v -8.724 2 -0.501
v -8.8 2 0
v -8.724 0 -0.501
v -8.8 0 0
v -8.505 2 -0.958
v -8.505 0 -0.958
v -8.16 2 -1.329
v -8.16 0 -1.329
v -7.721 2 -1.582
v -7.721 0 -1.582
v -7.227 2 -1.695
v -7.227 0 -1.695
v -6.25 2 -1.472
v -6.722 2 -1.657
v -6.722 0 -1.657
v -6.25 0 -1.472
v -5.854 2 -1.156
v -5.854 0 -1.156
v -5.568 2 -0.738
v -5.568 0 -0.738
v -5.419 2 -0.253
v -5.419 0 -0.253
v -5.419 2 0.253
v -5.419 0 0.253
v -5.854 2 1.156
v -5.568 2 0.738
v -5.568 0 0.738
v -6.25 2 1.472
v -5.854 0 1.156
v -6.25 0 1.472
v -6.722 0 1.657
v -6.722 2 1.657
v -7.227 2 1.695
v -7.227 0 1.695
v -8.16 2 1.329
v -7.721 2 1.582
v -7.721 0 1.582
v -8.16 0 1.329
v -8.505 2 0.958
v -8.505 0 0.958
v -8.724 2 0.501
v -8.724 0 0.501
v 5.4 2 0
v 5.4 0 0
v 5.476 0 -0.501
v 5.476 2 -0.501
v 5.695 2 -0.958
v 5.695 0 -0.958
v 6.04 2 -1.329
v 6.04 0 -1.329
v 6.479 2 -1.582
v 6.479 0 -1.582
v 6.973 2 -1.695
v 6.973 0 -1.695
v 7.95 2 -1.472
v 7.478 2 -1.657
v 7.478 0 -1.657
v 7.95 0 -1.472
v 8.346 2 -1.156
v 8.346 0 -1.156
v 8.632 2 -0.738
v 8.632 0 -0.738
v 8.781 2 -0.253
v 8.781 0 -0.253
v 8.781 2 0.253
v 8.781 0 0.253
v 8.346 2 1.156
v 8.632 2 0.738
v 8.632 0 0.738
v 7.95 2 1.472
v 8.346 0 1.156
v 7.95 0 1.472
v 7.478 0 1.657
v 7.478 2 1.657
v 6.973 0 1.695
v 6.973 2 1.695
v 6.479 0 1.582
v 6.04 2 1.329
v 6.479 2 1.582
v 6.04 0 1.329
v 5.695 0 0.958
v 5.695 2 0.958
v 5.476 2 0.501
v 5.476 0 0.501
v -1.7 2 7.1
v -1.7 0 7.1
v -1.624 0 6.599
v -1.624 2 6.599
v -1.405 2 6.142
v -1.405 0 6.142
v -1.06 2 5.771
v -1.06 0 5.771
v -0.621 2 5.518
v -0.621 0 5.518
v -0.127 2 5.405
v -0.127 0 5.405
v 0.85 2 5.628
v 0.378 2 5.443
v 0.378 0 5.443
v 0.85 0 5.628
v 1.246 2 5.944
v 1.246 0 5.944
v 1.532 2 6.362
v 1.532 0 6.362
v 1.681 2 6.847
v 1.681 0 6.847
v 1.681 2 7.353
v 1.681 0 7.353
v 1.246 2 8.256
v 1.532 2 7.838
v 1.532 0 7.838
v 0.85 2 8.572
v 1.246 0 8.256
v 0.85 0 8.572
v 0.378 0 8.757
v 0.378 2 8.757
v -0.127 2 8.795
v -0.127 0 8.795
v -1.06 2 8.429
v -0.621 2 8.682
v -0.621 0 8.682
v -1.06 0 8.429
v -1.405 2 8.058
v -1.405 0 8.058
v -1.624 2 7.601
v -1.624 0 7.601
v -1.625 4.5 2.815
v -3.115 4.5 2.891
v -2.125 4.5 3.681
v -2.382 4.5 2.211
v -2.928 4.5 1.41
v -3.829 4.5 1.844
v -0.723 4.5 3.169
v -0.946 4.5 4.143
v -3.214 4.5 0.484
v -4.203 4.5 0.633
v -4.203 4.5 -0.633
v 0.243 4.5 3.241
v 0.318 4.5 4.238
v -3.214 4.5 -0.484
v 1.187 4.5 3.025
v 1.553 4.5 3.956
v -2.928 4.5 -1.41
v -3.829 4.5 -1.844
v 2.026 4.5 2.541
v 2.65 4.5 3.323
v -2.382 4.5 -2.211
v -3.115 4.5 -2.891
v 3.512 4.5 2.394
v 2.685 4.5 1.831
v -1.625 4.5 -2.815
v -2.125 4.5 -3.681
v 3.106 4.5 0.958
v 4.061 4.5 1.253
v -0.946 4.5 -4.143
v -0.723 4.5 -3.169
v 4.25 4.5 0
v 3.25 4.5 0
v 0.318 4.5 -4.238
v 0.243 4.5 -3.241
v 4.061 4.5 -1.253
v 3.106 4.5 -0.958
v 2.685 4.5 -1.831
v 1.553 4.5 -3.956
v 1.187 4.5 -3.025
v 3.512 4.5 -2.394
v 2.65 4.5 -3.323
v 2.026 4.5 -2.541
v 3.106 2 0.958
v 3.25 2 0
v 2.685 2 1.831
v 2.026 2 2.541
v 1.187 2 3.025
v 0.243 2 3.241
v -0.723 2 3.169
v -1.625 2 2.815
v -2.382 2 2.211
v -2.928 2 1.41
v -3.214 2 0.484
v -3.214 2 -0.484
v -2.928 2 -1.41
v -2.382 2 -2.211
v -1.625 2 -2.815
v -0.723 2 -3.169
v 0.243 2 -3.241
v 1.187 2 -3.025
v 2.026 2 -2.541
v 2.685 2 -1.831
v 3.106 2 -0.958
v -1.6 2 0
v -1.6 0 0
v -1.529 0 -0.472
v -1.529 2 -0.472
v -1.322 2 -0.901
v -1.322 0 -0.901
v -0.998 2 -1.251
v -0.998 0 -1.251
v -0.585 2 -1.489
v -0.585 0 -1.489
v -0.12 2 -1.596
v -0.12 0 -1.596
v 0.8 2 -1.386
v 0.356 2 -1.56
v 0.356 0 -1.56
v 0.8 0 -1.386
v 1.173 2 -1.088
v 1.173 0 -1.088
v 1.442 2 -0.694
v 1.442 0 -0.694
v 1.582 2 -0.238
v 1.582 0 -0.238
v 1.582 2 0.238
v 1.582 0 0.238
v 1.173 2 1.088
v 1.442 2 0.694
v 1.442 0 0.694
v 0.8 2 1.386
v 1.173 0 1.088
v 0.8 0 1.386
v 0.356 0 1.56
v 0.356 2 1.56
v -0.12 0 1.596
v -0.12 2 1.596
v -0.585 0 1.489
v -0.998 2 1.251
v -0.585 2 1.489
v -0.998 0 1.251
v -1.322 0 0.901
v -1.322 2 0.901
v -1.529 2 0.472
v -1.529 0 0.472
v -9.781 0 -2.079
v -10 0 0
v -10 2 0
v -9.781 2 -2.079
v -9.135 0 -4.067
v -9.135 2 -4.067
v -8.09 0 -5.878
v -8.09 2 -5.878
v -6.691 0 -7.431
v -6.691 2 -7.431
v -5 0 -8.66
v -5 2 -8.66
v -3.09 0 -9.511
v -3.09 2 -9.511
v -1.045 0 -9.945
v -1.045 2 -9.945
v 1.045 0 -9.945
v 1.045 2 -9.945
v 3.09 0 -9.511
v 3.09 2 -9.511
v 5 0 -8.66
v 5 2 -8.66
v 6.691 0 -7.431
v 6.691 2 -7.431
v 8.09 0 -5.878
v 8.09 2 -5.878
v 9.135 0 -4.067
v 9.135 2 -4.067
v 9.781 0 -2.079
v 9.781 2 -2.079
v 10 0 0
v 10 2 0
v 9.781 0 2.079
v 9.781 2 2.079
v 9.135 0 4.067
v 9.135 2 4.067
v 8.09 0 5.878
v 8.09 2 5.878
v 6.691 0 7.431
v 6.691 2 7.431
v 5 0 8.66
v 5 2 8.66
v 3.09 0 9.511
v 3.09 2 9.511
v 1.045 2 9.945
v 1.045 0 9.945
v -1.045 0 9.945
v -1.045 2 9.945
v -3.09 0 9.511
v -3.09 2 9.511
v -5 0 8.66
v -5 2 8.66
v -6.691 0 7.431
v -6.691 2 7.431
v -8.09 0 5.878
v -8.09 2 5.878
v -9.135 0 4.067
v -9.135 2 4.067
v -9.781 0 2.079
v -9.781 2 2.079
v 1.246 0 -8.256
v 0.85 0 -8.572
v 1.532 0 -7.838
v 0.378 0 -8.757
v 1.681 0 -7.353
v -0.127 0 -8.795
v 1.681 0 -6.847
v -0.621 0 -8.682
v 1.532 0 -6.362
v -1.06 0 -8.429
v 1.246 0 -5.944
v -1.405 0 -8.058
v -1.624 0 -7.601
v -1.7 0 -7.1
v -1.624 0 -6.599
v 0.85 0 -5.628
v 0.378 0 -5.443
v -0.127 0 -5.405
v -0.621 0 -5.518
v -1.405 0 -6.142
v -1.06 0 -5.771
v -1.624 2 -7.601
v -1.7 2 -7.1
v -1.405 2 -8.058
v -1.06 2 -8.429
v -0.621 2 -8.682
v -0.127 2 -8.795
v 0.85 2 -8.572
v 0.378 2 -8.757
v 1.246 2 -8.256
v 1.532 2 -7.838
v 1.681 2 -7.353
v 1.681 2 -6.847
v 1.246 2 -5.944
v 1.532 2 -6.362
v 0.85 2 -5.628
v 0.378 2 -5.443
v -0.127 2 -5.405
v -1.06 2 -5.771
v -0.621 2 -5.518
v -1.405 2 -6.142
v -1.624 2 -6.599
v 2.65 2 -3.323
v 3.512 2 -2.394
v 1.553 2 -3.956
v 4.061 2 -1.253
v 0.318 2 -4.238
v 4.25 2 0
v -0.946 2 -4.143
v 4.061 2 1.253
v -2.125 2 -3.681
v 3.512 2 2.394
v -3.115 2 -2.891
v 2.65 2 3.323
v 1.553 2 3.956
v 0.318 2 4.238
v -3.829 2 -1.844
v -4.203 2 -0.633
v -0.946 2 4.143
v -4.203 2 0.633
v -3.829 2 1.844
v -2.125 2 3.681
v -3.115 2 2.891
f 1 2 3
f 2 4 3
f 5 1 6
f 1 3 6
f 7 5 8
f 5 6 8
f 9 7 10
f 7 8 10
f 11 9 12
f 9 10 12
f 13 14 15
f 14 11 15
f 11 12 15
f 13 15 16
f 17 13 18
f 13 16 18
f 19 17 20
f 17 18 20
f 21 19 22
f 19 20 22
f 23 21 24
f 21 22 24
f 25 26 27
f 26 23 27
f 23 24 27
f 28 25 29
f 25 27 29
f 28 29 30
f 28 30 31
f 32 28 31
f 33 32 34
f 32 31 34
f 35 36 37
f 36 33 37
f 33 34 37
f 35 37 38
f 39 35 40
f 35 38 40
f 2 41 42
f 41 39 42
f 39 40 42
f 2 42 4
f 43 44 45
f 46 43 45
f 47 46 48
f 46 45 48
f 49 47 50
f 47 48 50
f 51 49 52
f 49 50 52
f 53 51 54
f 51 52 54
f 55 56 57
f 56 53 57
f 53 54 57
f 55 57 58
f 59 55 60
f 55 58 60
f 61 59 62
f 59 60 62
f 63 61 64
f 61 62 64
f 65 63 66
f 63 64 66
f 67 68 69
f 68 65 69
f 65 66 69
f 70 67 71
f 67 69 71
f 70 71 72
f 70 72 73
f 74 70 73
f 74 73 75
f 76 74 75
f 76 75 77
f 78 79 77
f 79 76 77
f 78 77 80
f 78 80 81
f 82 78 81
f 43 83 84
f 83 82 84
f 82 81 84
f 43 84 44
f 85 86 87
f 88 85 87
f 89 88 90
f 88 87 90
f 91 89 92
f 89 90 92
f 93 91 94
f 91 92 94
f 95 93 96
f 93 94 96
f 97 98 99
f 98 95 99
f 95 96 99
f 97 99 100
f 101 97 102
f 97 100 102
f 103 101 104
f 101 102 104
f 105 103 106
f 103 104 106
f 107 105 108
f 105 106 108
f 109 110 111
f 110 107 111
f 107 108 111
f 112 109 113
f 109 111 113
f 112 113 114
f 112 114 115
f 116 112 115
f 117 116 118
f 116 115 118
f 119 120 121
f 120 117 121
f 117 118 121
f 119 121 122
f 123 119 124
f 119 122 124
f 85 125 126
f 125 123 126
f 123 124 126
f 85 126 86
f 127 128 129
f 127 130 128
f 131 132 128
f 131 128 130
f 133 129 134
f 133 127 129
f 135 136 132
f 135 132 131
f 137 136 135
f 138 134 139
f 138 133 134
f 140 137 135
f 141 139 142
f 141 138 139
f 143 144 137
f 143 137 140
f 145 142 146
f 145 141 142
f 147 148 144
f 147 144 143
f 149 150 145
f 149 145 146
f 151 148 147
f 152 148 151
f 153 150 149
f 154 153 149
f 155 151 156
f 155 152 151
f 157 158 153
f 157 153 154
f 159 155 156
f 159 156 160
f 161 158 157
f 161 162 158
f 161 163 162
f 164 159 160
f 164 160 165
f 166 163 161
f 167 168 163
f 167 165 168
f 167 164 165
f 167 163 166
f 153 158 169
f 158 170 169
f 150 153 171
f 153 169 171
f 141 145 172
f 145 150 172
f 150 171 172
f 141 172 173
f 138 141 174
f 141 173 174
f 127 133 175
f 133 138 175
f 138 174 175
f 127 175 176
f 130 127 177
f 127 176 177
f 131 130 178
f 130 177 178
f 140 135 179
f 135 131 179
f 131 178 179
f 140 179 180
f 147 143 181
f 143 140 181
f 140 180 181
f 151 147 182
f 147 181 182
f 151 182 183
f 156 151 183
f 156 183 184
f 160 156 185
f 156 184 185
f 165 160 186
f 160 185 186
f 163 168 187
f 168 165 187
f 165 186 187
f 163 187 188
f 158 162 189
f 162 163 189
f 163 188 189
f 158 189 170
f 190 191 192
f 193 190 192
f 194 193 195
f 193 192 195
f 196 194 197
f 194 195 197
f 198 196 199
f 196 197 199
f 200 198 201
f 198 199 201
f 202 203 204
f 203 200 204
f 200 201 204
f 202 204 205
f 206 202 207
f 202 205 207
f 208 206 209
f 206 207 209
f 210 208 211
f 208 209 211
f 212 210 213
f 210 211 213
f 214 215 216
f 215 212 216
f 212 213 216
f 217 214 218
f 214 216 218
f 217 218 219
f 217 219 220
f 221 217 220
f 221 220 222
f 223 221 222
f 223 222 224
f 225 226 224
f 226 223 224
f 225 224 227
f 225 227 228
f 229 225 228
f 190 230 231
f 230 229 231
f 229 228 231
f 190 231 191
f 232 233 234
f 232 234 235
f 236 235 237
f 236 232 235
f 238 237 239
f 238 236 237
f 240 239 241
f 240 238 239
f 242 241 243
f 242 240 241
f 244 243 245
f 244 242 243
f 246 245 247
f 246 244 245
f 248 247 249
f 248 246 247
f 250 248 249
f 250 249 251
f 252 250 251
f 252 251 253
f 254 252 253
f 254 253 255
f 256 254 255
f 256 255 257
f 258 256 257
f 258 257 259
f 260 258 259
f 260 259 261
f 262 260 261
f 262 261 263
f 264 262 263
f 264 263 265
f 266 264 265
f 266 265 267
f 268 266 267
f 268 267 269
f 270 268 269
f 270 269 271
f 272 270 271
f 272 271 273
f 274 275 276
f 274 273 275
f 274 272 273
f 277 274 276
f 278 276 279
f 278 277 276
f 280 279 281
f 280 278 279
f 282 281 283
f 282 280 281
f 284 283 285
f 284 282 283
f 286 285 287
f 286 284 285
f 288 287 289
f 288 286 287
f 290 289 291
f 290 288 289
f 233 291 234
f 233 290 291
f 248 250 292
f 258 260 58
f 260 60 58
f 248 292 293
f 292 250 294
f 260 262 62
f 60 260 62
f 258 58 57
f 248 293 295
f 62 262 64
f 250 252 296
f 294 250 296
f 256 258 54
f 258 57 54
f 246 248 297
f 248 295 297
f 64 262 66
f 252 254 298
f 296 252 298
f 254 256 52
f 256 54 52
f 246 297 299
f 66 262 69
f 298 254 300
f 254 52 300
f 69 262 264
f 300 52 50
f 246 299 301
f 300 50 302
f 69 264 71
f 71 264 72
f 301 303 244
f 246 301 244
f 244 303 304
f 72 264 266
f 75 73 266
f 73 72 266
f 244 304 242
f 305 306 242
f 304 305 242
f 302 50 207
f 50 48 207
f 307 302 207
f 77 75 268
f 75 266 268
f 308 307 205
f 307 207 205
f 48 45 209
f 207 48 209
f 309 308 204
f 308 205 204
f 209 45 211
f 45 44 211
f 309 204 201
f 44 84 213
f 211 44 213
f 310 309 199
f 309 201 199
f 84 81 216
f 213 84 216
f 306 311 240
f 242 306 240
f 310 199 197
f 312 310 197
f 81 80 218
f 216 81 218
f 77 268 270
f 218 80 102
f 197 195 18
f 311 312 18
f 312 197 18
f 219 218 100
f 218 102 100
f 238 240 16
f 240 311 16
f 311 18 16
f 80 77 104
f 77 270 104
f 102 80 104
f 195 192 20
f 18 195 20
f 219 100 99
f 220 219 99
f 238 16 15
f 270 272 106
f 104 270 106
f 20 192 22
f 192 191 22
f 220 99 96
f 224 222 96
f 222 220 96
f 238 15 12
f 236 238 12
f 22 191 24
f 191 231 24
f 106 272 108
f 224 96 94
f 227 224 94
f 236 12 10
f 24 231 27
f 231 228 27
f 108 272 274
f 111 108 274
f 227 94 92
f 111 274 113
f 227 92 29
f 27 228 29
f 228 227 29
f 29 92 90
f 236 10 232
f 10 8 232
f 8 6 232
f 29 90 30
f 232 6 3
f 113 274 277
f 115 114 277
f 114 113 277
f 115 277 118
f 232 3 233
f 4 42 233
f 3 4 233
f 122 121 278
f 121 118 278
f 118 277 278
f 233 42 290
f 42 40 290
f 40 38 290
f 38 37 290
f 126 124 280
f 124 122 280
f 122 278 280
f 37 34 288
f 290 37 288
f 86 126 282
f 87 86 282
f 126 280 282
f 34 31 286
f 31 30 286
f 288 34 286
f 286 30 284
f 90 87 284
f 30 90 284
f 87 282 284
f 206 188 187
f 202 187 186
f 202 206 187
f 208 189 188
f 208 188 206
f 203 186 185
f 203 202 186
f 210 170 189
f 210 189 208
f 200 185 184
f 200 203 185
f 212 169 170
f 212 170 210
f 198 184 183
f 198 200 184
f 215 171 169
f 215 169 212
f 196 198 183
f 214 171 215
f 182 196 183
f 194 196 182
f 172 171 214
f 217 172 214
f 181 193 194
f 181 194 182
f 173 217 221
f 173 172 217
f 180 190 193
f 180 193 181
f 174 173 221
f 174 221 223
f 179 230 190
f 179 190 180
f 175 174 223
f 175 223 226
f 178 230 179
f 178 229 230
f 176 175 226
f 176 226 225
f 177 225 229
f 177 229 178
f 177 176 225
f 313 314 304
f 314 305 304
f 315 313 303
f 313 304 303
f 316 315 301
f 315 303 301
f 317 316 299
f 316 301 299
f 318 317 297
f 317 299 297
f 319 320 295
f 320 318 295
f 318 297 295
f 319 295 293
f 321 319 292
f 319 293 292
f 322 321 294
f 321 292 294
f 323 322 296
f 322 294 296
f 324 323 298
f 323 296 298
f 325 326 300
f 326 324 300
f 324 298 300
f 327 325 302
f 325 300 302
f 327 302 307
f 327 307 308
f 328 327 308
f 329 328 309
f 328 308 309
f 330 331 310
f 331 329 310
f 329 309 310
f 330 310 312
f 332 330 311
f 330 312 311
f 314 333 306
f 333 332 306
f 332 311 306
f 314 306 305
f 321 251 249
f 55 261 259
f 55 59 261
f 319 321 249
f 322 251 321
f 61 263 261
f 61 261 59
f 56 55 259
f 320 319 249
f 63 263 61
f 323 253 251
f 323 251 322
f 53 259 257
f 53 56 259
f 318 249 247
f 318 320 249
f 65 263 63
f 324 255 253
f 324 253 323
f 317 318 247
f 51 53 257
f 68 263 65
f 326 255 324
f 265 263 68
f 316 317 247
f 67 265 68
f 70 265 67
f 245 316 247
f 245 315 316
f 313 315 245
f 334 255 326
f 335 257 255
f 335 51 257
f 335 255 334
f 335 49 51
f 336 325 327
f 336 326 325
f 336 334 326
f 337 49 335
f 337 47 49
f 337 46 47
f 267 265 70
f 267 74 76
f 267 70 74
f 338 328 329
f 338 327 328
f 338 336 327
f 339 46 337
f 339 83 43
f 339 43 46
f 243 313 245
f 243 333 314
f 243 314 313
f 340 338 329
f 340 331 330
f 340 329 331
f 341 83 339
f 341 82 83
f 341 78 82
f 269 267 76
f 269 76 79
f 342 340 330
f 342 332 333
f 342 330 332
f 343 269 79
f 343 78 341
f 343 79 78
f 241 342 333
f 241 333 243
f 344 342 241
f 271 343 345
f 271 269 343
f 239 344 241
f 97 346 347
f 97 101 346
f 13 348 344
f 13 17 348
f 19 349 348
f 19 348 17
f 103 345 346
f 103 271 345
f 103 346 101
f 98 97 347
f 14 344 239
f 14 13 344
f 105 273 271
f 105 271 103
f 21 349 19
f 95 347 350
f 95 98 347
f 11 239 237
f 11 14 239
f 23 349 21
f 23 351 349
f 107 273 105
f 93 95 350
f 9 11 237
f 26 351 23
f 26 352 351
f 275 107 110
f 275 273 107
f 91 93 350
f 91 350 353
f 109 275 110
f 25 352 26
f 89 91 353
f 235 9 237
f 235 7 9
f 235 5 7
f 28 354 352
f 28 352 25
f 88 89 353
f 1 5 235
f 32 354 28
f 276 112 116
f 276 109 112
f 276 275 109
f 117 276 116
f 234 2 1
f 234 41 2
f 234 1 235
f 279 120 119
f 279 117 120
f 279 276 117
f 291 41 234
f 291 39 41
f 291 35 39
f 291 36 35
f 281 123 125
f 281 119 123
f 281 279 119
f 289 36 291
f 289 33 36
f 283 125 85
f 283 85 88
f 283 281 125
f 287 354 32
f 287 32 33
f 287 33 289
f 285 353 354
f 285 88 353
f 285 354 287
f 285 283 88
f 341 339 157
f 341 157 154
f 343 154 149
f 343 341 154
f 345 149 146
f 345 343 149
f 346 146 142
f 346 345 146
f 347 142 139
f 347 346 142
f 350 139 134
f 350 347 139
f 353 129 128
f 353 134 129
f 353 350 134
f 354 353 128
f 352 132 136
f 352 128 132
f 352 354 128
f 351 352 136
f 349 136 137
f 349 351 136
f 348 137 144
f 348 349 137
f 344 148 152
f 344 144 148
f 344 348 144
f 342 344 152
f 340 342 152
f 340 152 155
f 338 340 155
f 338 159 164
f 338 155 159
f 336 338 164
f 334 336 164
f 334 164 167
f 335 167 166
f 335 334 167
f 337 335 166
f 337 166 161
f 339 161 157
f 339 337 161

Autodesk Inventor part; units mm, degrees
ref_plane "YZ Plane" through (0, 0, 0) normal (1, 0, 0) x (0, 1, 0)
ref_plane "XZ Plane" through (0, 0, 0) normal (0, 1, 0) x (-1, 0, 0)
ref_plane "XY Plane" through (0, 0, 0) normal (0, 0, 1) x (1, 0, 0)
sketch "Эскиз1" plane through (0, 0, 0) normal (0, 1, 0) x (-1, 0, 0)
  circle A0 centre (0, 0) radius 10
  circle A1 centre (0, 0) radius 1.6
  circle A2 centre (0, 7.1) radius 1.7
  circle A3 centre (-7.1, 0) radius 1.7
  circle A4 centre (0, -7.1) radius 1.7
  circle A5 centre (7.1, 0) radius 1.7
  dimension "d0" = 20
  dimension "d1" = 3.2
  dimension "d2" = 3.4
  dimension "d3" = 1.2
  dimension "d6" = 360
extrude "Выдавливание1" add sketch "Эскиз1" along normal blind 2
sketch "Эскиз2" plane through (0, 2, 0) normal (0, 1, 0) x (1, 0, 0)
  circle A0 centre (0, 0) radius 1.6 projected
  circle A1 centre (0, 0) radius 4.25
  circle A2 centre (0, 0) radius 3.25
  dimension "d10" = 8.5
  dimension "d11" = 6.5
extrude "Выдавливание2" add sketch "Эскиз2" along normal blind 2.5 contours A1
properties part number "Servo krepej"
